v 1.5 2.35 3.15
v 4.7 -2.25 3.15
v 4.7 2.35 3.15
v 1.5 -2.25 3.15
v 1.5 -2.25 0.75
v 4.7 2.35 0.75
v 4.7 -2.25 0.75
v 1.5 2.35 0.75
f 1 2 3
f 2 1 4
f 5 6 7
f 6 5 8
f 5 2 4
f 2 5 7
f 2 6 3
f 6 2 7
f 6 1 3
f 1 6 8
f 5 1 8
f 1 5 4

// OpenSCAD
union() {
  translate([1.5, -2.25, 0.75]) cube(size=[3.2,4.6,2.4], center=false);
}
